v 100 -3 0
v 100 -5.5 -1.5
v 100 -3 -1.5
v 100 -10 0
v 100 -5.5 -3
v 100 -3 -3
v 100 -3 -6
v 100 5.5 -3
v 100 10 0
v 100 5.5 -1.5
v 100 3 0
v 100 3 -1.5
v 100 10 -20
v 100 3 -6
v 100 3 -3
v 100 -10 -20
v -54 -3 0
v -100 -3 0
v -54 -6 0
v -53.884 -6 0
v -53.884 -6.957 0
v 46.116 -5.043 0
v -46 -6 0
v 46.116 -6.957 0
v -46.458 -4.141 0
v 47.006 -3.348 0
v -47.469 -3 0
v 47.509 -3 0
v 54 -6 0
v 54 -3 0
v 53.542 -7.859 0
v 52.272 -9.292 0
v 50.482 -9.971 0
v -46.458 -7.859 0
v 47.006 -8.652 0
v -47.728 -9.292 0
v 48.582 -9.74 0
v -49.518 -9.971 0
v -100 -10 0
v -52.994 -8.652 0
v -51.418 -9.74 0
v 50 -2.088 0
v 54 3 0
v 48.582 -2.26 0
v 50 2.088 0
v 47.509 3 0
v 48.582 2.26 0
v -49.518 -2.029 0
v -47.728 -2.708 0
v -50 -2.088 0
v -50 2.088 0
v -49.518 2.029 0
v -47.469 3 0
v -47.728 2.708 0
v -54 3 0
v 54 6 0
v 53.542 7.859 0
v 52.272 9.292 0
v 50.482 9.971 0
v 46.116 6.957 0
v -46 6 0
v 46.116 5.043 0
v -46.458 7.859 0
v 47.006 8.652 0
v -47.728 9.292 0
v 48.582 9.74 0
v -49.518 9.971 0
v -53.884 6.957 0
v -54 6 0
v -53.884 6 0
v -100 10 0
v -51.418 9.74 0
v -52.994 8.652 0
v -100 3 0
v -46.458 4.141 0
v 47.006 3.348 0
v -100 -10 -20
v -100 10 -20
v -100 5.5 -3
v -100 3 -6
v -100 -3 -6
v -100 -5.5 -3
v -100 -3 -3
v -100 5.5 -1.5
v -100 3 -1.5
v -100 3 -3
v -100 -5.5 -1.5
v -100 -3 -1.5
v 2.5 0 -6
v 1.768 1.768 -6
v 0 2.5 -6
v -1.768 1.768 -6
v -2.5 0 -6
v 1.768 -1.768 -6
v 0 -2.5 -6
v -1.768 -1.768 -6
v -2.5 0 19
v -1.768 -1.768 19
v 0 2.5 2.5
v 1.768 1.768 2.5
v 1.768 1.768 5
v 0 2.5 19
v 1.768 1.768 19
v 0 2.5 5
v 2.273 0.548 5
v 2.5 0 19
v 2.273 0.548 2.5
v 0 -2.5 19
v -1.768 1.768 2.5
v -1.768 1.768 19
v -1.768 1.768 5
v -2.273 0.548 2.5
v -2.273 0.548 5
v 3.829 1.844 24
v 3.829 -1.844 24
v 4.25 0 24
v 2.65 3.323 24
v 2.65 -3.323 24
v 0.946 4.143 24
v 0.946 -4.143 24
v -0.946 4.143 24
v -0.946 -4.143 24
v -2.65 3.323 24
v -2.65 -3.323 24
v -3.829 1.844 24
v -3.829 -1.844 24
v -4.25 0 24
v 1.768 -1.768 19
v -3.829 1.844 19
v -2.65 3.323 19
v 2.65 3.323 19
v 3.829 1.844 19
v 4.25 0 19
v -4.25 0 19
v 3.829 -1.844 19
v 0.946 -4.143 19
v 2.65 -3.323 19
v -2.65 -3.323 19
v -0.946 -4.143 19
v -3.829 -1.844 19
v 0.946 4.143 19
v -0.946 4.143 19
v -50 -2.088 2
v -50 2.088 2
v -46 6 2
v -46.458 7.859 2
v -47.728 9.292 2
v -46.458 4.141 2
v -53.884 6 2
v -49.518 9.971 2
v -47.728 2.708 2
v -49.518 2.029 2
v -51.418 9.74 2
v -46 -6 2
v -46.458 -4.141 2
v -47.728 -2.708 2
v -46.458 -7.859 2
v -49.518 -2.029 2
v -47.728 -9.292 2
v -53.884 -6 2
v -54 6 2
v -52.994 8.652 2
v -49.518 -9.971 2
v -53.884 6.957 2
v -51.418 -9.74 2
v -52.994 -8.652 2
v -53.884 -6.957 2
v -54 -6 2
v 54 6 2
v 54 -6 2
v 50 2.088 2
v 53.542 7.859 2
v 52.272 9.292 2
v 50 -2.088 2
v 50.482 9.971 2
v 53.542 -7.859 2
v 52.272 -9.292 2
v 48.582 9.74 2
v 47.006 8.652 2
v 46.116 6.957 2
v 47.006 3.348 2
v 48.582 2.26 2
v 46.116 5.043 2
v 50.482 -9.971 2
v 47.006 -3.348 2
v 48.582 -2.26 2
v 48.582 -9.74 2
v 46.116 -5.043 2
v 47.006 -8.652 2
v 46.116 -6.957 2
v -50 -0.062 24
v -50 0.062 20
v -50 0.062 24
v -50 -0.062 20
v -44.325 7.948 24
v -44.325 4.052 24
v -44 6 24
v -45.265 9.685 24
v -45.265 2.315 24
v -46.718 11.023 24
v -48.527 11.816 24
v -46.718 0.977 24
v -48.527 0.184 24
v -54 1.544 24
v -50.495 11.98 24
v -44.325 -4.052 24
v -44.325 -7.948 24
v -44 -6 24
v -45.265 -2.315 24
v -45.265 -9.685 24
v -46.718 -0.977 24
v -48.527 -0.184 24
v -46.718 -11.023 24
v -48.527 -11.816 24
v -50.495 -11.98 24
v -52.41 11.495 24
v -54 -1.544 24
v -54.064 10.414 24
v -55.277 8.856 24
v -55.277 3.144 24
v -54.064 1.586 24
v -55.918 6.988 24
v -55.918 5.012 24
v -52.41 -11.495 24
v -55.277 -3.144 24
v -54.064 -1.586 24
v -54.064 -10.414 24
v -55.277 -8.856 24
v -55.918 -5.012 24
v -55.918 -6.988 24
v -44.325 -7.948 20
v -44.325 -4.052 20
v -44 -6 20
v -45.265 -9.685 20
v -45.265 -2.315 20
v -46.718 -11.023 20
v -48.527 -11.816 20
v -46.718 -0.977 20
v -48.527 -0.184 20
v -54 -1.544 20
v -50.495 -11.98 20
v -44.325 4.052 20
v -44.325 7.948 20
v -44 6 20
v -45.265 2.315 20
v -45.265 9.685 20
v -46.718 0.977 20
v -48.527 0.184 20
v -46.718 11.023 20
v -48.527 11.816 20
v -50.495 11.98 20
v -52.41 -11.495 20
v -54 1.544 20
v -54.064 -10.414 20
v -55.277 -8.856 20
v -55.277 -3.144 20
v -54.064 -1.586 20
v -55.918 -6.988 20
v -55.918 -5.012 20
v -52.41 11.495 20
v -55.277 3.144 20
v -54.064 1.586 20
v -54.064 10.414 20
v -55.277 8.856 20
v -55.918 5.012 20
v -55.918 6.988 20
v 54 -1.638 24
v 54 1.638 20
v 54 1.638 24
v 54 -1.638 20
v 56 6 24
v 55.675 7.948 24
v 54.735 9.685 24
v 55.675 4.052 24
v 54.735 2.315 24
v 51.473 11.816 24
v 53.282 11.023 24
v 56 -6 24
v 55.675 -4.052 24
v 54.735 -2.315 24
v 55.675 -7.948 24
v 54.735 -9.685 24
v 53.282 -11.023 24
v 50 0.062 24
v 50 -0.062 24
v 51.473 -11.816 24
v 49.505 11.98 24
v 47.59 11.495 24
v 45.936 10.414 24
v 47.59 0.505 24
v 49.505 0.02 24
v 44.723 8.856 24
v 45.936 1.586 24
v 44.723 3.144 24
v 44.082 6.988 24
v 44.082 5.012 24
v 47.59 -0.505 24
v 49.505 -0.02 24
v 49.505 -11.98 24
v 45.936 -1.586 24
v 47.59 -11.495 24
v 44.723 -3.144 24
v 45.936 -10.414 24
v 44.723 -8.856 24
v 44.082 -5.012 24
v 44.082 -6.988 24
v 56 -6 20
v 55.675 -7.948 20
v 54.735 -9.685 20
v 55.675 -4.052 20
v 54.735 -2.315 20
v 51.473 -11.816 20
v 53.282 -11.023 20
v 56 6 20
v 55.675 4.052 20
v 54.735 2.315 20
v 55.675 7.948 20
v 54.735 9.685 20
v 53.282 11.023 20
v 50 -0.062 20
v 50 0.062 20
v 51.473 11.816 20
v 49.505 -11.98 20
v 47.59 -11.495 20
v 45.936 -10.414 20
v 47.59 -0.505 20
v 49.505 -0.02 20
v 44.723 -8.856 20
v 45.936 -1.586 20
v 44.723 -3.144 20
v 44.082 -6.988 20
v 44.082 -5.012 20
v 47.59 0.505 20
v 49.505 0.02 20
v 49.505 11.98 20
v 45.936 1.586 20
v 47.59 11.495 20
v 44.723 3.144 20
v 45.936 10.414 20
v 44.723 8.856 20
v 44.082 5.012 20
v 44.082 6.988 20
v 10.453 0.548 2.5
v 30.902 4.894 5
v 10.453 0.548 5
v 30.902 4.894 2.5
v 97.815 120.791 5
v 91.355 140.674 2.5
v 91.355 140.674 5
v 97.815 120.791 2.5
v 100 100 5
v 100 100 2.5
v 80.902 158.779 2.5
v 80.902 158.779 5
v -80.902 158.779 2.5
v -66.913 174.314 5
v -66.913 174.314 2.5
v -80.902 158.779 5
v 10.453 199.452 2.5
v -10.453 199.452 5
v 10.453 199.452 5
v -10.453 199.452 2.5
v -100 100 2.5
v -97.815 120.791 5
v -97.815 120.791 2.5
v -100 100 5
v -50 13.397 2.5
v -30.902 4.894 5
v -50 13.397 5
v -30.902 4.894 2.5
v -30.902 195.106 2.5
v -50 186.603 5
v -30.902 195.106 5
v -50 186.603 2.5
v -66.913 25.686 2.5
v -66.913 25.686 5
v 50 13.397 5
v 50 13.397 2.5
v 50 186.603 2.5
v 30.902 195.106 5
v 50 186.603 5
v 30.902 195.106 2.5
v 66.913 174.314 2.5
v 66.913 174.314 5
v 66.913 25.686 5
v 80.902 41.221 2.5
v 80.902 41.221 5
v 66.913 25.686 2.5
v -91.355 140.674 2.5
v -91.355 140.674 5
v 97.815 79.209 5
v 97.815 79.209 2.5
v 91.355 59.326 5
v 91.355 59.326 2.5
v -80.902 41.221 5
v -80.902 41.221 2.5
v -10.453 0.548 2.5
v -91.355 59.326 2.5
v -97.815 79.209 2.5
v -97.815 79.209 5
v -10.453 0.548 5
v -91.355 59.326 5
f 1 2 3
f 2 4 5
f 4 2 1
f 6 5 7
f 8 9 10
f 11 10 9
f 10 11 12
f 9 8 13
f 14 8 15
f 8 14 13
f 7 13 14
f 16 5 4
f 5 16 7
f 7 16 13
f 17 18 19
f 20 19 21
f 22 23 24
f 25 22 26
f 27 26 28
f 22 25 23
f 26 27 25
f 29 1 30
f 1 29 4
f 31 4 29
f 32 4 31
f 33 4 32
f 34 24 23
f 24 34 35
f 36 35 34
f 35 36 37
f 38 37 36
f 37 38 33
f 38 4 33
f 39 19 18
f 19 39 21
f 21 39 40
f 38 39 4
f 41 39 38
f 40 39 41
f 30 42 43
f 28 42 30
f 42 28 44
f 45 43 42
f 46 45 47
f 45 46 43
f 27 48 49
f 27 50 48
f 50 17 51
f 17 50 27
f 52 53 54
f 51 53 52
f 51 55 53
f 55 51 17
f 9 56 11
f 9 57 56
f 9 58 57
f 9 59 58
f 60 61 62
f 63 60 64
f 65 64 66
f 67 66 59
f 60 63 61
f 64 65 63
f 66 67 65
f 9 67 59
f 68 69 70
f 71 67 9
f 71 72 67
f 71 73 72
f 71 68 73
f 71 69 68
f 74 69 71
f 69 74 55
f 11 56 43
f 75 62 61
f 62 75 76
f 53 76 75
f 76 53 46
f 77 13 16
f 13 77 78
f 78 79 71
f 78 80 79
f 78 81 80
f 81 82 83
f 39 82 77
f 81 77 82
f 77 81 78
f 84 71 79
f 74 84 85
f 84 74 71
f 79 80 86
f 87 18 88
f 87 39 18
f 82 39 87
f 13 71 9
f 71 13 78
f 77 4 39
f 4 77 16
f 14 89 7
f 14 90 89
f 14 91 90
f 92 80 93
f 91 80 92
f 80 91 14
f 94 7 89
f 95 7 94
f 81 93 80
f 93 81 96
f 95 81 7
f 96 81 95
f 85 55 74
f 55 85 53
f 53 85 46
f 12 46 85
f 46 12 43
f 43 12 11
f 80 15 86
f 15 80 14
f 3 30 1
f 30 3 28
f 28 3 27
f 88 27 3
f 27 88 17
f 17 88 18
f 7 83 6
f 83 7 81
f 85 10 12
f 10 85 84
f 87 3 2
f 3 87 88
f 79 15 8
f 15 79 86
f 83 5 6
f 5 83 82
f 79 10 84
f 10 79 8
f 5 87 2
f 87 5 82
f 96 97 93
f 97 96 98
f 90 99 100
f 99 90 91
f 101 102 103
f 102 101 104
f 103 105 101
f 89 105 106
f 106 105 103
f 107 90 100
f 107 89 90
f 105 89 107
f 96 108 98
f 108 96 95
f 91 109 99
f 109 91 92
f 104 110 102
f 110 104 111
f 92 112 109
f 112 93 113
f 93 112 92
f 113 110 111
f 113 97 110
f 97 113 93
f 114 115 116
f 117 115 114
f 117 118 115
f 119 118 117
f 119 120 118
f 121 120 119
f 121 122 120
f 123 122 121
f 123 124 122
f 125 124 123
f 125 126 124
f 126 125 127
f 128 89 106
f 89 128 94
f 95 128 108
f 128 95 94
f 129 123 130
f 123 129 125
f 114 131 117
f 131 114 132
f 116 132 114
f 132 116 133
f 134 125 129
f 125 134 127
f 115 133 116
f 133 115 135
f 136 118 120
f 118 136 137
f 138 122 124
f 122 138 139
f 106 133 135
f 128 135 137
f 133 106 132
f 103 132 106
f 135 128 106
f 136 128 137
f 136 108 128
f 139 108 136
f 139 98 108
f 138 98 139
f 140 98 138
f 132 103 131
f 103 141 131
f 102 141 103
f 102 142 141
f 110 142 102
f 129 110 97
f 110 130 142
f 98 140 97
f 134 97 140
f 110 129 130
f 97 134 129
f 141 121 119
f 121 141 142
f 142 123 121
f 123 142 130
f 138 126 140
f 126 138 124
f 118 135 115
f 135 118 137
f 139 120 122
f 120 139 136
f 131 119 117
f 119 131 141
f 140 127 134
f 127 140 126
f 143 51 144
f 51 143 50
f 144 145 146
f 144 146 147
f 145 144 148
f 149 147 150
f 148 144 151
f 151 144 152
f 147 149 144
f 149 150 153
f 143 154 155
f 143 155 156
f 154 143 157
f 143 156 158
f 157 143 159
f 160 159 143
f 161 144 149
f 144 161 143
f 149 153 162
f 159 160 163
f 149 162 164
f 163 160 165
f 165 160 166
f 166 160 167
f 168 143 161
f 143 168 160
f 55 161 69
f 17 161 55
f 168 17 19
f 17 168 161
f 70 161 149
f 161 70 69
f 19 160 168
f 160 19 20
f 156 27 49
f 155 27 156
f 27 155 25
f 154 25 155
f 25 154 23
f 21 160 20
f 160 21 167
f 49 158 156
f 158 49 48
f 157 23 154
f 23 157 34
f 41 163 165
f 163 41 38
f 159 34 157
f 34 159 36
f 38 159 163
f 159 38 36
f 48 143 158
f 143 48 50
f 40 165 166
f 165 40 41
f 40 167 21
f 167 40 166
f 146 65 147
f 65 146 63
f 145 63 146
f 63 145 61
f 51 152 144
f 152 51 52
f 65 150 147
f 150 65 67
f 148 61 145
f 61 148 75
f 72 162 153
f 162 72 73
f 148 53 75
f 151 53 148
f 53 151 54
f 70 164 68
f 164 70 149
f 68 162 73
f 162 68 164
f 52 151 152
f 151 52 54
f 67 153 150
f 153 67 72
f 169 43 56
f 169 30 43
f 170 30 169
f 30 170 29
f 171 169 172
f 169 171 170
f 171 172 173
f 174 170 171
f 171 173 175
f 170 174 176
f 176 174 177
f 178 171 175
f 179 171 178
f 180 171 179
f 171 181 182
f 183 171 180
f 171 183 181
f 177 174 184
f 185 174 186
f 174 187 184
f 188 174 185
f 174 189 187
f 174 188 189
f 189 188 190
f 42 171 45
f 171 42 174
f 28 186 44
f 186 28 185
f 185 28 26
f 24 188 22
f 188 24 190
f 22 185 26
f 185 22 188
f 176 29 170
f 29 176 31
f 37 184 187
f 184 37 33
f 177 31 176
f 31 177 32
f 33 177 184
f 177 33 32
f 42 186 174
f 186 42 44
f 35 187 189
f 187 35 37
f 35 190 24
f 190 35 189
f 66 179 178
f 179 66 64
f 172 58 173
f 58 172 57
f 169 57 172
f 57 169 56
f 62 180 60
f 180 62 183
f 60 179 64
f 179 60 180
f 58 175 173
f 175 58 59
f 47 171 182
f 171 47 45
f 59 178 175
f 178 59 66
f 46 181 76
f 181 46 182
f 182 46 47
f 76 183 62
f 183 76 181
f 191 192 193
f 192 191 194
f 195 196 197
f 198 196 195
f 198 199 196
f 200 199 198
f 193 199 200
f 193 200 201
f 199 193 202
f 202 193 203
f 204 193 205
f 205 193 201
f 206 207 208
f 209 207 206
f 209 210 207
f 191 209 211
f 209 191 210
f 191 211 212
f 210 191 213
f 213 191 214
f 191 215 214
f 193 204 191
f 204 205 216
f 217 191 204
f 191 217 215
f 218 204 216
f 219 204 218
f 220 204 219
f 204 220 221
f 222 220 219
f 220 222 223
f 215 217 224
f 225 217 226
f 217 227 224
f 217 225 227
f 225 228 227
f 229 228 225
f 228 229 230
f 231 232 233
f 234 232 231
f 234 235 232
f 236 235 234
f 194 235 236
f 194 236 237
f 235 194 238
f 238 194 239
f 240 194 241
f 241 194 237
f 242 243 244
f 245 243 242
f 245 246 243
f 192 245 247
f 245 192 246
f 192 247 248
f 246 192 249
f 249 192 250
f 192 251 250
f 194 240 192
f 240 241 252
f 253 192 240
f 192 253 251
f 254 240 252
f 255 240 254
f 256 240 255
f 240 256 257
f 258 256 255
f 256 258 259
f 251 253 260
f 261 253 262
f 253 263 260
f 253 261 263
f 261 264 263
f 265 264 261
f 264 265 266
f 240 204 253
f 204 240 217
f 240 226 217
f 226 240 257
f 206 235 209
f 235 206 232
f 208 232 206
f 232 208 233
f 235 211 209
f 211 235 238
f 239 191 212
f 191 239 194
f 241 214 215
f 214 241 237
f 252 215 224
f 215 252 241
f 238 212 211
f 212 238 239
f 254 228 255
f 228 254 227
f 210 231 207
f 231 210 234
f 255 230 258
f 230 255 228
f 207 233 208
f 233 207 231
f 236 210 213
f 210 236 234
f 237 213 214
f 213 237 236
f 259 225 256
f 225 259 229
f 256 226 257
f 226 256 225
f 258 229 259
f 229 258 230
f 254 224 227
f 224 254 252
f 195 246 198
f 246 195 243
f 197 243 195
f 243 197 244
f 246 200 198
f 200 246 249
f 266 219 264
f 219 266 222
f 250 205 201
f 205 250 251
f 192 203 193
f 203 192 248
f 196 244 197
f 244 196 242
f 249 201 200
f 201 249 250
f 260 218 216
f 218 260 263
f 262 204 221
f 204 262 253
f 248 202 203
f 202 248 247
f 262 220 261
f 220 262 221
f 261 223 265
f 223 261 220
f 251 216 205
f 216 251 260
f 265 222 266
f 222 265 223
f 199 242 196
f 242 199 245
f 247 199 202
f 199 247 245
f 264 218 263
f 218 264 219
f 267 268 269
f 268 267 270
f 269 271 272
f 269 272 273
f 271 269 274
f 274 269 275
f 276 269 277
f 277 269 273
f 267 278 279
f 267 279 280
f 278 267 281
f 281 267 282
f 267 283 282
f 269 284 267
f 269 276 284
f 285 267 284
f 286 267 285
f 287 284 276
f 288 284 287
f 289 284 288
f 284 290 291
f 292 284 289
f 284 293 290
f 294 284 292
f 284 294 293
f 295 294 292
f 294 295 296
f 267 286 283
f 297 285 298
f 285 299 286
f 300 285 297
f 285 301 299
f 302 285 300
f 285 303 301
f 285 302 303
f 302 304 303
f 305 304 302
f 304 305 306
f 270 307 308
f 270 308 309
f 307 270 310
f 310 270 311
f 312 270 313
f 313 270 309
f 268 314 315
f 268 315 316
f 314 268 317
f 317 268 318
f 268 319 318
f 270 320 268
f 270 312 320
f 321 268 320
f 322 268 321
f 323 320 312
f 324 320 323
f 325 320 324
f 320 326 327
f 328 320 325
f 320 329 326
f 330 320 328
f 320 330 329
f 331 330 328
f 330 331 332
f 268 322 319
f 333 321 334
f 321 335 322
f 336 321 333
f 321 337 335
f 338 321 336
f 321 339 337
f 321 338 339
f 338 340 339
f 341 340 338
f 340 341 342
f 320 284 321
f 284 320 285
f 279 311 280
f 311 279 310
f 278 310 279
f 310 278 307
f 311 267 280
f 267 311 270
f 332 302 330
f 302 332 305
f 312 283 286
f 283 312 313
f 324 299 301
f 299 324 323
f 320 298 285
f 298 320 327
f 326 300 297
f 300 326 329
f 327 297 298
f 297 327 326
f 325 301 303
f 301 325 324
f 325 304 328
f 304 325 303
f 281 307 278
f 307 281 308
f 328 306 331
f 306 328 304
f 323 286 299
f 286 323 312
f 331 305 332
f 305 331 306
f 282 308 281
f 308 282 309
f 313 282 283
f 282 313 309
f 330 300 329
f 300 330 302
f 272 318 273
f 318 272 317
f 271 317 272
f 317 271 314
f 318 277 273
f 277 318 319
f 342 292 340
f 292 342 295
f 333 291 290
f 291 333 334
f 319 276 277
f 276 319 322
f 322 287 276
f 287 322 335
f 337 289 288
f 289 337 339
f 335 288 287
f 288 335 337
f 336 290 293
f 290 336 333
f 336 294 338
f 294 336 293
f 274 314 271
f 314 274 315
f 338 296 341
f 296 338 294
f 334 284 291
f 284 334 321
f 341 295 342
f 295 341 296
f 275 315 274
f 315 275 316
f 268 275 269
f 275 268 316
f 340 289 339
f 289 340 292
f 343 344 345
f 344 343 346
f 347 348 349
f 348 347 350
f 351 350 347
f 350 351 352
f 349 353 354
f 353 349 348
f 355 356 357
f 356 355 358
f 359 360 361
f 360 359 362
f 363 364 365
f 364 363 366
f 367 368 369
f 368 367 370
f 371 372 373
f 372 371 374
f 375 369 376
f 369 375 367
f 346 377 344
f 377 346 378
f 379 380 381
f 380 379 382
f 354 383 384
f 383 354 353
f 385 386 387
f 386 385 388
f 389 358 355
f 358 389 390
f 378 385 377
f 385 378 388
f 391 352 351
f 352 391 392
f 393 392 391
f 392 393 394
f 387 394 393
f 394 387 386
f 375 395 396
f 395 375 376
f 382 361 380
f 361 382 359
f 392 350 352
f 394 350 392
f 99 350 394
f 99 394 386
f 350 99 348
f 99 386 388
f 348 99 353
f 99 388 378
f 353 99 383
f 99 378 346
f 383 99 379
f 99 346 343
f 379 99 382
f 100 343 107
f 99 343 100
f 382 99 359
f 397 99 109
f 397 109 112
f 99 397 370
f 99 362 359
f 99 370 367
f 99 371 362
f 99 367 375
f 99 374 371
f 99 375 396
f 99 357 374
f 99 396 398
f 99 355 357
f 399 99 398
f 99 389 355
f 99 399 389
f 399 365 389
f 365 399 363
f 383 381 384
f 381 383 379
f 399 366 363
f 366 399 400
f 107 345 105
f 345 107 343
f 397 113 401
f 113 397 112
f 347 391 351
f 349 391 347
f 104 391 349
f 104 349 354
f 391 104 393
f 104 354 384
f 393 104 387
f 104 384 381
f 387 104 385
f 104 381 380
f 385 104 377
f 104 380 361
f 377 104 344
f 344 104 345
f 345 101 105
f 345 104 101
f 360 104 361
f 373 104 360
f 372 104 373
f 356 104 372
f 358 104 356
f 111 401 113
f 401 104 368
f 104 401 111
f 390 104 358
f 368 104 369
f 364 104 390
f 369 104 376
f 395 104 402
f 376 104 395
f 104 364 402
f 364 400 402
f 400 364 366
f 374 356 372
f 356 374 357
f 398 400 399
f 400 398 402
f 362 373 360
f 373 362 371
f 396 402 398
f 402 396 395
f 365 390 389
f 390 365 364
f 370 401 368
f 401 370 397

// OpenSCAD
// glass plate
#translate([0,100,2.5]) cylinder(r=100,h=2.5);

// aluminum extrusion
#difference()
{
    translate([-100,-10,-20]) cube([200,20,20]);
    translate([-100,-3,-6]) cube([200,6,6]);
    translate([-100,-5.5,-3]) cube([200,11,1.5]);
}

// M5-30 screw
#translate([0,0,-6]) union()
{
    translate([0,0,0]) cylinder(r=2.5,h=30);
    translate([0,0,25]) cylinder(r=4.25,h=5);
}

// bottom
difference()
{
    union()
    {
        //translate([-50,-10, 0]) cube([100,20,2]);

        translate([-54,-6, 0]) cube([4,12,2]);
        translate([-50,-6,0]) cylinder(r=4,h=2);
        translate([-50,6,0]) cylinder(r=4,h=2);

        translate([50,-6, 0]) cube([4,12,2]);
        translate([50,-6,0]) cylinder(r=4,h=2);
        translate([50,6,0]) cylinder(r=4,h=2);
    }
    
    difference()
    {
    }
}

// top
#translate([0,0,20]) difference()
{
    union()
    {
        //translate([-50,-10, 0]) cube([100,20,4]);

        translate([-54,-6, 0]) cube([4,12,4]);
        translate([-50,-6,0]) cylinder(r=6,h=4);
        translate([-50,6,0]) cylinder(r=6,h=4);

        translate([50,-6, 0]) cube([4,12,4]);
        translate([50,-6,0]) cylinder(r=6,h=4);
        translate([50,6,0]) cylinder(r=6,h=4);
    }
    
    translate() cube([]);
}
